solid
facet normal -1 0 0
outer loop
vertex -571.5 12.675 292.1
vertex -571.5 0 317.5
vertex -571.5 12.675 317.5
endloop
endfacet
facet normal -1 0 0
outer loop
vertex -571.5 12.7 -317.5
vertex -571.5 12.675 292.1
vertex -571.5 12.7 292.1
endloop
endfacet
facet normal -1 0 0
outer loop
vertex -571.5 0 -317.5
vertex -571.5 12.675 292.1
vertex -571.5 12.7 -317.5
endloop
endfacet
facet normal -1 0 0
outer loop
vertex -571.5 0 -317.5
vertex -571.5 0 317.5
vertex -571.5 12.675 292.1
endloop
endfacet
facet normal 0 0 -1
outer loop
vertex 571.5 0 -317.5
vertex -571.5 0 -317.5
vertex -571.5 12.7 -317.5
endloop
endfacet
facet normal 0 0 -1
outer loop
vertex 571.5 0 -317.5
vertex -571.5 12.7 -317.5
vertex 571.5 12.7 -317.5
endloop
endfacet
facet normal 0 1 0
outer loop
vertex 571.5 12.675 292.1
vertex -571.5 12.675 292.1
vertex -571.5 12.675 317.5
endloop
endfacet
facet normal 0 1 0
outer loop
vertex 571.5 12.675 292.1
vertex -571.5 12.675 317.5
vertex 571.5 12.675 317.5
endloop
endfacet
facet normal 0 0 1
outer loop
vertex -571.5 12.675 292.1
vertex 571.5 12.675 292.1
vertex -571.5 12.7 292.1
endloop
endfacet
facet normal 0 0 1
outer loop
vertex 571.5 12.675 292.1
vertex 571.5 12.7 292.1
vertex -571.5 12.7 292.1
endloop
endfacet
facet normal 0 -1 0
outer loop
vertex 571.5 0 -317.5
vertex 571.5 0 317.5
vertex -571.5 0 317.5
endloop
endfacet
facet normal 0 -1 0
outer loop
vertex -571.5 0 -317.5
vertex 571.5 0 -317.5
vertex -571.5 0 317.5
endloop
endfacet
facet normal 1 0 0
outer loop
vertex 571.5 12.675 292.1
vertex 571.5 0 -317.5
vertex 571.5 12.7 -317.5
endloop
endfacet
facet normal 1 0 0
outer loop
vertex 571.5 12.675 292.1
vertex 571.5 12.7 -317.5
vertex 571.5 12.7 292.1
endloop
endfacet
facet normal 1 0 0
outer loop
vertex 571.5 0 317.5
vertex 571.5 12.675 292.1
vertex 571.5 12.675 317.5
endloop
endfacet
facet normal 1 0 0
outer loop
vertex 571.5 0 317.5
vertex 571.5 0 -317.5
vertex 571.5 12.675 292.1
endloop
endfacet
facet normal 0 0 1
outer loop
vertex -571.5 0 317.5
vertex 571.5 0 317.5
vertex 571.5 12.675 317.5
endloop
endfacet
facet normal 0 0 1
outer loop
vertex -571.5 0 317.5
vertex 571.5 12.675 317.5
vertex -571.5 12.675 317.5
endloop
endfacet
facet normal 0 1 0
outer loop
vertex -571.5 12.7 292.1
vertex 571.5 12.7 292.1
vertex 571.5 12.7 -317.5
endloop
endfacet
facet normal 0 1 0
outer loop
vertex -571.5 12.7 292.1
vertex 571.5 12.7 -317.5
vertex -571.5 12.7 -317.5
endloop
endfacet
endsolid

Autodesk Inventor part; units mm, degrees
ref_plane "YZ Plane" through (0, 0, 0) normal (1, 0, 0) x (0, 1, 0)
ref_plane "XZ Plane" through (0, 0, 0) normal (0, 1, 0) x (-1, 0, 0)
ref_plane "XY Plane" through (0, 0, 0) normal (0, 0, 1) x (1, 0, 0)
sketch "Sketch1" plane through (0, 0, 0) normal (0, 1, 0) x (-1, 0, 0)
  line L0 (-571.5, 317.5) -> (571.5, 317.5)
  line L1 (571.5, 317.5) -> (571.5, -317.5)
  line L2 (571.5, -317.5) -> (-571.5, -317.5)
  line L3 (-571.5, -317.5) -> (-571.5, 317.5)
  line L4 (-571.5, 317.5) -> (571.5, -317.5) construction
  line L5 (571.5, 317.5) -> (-571.5, -317.5) construction
  point P0 (0, 0)
  dimension "d0" = 1143
  dimension "d1" = 635
extrude "Extrusion1" add sketch "Sketch1" along normal blind 12.7
sketch "Sketch2" plane through (0, 12.7, 0) normal (0, 1, 0) x (1, 0, 0)
  line L0 (-571.5, -317.5) -> (571.5, -317.5) projected
  line L1 (571.5, -317.5) -> (571.5, 317.5) projected
  line L2 (-571.5, -317.5) -> (571.5, -317.5)
  line L3 (571.5, -317.5) -> (571.5, -292.1)
  line L4 (571.5, -292.1) -> (-571.5, -292.1)
  line L5 (-571.5, -292.1) -> (-571.5, -317.5)
  point P0 (0, 0)
  dimension "d4" = 25.4
extrude "Extrusion2" cut sketch "Sketch2" against normal blind 0.0254
properties part number "floorMidLayer" material "Wood (Birch)"
